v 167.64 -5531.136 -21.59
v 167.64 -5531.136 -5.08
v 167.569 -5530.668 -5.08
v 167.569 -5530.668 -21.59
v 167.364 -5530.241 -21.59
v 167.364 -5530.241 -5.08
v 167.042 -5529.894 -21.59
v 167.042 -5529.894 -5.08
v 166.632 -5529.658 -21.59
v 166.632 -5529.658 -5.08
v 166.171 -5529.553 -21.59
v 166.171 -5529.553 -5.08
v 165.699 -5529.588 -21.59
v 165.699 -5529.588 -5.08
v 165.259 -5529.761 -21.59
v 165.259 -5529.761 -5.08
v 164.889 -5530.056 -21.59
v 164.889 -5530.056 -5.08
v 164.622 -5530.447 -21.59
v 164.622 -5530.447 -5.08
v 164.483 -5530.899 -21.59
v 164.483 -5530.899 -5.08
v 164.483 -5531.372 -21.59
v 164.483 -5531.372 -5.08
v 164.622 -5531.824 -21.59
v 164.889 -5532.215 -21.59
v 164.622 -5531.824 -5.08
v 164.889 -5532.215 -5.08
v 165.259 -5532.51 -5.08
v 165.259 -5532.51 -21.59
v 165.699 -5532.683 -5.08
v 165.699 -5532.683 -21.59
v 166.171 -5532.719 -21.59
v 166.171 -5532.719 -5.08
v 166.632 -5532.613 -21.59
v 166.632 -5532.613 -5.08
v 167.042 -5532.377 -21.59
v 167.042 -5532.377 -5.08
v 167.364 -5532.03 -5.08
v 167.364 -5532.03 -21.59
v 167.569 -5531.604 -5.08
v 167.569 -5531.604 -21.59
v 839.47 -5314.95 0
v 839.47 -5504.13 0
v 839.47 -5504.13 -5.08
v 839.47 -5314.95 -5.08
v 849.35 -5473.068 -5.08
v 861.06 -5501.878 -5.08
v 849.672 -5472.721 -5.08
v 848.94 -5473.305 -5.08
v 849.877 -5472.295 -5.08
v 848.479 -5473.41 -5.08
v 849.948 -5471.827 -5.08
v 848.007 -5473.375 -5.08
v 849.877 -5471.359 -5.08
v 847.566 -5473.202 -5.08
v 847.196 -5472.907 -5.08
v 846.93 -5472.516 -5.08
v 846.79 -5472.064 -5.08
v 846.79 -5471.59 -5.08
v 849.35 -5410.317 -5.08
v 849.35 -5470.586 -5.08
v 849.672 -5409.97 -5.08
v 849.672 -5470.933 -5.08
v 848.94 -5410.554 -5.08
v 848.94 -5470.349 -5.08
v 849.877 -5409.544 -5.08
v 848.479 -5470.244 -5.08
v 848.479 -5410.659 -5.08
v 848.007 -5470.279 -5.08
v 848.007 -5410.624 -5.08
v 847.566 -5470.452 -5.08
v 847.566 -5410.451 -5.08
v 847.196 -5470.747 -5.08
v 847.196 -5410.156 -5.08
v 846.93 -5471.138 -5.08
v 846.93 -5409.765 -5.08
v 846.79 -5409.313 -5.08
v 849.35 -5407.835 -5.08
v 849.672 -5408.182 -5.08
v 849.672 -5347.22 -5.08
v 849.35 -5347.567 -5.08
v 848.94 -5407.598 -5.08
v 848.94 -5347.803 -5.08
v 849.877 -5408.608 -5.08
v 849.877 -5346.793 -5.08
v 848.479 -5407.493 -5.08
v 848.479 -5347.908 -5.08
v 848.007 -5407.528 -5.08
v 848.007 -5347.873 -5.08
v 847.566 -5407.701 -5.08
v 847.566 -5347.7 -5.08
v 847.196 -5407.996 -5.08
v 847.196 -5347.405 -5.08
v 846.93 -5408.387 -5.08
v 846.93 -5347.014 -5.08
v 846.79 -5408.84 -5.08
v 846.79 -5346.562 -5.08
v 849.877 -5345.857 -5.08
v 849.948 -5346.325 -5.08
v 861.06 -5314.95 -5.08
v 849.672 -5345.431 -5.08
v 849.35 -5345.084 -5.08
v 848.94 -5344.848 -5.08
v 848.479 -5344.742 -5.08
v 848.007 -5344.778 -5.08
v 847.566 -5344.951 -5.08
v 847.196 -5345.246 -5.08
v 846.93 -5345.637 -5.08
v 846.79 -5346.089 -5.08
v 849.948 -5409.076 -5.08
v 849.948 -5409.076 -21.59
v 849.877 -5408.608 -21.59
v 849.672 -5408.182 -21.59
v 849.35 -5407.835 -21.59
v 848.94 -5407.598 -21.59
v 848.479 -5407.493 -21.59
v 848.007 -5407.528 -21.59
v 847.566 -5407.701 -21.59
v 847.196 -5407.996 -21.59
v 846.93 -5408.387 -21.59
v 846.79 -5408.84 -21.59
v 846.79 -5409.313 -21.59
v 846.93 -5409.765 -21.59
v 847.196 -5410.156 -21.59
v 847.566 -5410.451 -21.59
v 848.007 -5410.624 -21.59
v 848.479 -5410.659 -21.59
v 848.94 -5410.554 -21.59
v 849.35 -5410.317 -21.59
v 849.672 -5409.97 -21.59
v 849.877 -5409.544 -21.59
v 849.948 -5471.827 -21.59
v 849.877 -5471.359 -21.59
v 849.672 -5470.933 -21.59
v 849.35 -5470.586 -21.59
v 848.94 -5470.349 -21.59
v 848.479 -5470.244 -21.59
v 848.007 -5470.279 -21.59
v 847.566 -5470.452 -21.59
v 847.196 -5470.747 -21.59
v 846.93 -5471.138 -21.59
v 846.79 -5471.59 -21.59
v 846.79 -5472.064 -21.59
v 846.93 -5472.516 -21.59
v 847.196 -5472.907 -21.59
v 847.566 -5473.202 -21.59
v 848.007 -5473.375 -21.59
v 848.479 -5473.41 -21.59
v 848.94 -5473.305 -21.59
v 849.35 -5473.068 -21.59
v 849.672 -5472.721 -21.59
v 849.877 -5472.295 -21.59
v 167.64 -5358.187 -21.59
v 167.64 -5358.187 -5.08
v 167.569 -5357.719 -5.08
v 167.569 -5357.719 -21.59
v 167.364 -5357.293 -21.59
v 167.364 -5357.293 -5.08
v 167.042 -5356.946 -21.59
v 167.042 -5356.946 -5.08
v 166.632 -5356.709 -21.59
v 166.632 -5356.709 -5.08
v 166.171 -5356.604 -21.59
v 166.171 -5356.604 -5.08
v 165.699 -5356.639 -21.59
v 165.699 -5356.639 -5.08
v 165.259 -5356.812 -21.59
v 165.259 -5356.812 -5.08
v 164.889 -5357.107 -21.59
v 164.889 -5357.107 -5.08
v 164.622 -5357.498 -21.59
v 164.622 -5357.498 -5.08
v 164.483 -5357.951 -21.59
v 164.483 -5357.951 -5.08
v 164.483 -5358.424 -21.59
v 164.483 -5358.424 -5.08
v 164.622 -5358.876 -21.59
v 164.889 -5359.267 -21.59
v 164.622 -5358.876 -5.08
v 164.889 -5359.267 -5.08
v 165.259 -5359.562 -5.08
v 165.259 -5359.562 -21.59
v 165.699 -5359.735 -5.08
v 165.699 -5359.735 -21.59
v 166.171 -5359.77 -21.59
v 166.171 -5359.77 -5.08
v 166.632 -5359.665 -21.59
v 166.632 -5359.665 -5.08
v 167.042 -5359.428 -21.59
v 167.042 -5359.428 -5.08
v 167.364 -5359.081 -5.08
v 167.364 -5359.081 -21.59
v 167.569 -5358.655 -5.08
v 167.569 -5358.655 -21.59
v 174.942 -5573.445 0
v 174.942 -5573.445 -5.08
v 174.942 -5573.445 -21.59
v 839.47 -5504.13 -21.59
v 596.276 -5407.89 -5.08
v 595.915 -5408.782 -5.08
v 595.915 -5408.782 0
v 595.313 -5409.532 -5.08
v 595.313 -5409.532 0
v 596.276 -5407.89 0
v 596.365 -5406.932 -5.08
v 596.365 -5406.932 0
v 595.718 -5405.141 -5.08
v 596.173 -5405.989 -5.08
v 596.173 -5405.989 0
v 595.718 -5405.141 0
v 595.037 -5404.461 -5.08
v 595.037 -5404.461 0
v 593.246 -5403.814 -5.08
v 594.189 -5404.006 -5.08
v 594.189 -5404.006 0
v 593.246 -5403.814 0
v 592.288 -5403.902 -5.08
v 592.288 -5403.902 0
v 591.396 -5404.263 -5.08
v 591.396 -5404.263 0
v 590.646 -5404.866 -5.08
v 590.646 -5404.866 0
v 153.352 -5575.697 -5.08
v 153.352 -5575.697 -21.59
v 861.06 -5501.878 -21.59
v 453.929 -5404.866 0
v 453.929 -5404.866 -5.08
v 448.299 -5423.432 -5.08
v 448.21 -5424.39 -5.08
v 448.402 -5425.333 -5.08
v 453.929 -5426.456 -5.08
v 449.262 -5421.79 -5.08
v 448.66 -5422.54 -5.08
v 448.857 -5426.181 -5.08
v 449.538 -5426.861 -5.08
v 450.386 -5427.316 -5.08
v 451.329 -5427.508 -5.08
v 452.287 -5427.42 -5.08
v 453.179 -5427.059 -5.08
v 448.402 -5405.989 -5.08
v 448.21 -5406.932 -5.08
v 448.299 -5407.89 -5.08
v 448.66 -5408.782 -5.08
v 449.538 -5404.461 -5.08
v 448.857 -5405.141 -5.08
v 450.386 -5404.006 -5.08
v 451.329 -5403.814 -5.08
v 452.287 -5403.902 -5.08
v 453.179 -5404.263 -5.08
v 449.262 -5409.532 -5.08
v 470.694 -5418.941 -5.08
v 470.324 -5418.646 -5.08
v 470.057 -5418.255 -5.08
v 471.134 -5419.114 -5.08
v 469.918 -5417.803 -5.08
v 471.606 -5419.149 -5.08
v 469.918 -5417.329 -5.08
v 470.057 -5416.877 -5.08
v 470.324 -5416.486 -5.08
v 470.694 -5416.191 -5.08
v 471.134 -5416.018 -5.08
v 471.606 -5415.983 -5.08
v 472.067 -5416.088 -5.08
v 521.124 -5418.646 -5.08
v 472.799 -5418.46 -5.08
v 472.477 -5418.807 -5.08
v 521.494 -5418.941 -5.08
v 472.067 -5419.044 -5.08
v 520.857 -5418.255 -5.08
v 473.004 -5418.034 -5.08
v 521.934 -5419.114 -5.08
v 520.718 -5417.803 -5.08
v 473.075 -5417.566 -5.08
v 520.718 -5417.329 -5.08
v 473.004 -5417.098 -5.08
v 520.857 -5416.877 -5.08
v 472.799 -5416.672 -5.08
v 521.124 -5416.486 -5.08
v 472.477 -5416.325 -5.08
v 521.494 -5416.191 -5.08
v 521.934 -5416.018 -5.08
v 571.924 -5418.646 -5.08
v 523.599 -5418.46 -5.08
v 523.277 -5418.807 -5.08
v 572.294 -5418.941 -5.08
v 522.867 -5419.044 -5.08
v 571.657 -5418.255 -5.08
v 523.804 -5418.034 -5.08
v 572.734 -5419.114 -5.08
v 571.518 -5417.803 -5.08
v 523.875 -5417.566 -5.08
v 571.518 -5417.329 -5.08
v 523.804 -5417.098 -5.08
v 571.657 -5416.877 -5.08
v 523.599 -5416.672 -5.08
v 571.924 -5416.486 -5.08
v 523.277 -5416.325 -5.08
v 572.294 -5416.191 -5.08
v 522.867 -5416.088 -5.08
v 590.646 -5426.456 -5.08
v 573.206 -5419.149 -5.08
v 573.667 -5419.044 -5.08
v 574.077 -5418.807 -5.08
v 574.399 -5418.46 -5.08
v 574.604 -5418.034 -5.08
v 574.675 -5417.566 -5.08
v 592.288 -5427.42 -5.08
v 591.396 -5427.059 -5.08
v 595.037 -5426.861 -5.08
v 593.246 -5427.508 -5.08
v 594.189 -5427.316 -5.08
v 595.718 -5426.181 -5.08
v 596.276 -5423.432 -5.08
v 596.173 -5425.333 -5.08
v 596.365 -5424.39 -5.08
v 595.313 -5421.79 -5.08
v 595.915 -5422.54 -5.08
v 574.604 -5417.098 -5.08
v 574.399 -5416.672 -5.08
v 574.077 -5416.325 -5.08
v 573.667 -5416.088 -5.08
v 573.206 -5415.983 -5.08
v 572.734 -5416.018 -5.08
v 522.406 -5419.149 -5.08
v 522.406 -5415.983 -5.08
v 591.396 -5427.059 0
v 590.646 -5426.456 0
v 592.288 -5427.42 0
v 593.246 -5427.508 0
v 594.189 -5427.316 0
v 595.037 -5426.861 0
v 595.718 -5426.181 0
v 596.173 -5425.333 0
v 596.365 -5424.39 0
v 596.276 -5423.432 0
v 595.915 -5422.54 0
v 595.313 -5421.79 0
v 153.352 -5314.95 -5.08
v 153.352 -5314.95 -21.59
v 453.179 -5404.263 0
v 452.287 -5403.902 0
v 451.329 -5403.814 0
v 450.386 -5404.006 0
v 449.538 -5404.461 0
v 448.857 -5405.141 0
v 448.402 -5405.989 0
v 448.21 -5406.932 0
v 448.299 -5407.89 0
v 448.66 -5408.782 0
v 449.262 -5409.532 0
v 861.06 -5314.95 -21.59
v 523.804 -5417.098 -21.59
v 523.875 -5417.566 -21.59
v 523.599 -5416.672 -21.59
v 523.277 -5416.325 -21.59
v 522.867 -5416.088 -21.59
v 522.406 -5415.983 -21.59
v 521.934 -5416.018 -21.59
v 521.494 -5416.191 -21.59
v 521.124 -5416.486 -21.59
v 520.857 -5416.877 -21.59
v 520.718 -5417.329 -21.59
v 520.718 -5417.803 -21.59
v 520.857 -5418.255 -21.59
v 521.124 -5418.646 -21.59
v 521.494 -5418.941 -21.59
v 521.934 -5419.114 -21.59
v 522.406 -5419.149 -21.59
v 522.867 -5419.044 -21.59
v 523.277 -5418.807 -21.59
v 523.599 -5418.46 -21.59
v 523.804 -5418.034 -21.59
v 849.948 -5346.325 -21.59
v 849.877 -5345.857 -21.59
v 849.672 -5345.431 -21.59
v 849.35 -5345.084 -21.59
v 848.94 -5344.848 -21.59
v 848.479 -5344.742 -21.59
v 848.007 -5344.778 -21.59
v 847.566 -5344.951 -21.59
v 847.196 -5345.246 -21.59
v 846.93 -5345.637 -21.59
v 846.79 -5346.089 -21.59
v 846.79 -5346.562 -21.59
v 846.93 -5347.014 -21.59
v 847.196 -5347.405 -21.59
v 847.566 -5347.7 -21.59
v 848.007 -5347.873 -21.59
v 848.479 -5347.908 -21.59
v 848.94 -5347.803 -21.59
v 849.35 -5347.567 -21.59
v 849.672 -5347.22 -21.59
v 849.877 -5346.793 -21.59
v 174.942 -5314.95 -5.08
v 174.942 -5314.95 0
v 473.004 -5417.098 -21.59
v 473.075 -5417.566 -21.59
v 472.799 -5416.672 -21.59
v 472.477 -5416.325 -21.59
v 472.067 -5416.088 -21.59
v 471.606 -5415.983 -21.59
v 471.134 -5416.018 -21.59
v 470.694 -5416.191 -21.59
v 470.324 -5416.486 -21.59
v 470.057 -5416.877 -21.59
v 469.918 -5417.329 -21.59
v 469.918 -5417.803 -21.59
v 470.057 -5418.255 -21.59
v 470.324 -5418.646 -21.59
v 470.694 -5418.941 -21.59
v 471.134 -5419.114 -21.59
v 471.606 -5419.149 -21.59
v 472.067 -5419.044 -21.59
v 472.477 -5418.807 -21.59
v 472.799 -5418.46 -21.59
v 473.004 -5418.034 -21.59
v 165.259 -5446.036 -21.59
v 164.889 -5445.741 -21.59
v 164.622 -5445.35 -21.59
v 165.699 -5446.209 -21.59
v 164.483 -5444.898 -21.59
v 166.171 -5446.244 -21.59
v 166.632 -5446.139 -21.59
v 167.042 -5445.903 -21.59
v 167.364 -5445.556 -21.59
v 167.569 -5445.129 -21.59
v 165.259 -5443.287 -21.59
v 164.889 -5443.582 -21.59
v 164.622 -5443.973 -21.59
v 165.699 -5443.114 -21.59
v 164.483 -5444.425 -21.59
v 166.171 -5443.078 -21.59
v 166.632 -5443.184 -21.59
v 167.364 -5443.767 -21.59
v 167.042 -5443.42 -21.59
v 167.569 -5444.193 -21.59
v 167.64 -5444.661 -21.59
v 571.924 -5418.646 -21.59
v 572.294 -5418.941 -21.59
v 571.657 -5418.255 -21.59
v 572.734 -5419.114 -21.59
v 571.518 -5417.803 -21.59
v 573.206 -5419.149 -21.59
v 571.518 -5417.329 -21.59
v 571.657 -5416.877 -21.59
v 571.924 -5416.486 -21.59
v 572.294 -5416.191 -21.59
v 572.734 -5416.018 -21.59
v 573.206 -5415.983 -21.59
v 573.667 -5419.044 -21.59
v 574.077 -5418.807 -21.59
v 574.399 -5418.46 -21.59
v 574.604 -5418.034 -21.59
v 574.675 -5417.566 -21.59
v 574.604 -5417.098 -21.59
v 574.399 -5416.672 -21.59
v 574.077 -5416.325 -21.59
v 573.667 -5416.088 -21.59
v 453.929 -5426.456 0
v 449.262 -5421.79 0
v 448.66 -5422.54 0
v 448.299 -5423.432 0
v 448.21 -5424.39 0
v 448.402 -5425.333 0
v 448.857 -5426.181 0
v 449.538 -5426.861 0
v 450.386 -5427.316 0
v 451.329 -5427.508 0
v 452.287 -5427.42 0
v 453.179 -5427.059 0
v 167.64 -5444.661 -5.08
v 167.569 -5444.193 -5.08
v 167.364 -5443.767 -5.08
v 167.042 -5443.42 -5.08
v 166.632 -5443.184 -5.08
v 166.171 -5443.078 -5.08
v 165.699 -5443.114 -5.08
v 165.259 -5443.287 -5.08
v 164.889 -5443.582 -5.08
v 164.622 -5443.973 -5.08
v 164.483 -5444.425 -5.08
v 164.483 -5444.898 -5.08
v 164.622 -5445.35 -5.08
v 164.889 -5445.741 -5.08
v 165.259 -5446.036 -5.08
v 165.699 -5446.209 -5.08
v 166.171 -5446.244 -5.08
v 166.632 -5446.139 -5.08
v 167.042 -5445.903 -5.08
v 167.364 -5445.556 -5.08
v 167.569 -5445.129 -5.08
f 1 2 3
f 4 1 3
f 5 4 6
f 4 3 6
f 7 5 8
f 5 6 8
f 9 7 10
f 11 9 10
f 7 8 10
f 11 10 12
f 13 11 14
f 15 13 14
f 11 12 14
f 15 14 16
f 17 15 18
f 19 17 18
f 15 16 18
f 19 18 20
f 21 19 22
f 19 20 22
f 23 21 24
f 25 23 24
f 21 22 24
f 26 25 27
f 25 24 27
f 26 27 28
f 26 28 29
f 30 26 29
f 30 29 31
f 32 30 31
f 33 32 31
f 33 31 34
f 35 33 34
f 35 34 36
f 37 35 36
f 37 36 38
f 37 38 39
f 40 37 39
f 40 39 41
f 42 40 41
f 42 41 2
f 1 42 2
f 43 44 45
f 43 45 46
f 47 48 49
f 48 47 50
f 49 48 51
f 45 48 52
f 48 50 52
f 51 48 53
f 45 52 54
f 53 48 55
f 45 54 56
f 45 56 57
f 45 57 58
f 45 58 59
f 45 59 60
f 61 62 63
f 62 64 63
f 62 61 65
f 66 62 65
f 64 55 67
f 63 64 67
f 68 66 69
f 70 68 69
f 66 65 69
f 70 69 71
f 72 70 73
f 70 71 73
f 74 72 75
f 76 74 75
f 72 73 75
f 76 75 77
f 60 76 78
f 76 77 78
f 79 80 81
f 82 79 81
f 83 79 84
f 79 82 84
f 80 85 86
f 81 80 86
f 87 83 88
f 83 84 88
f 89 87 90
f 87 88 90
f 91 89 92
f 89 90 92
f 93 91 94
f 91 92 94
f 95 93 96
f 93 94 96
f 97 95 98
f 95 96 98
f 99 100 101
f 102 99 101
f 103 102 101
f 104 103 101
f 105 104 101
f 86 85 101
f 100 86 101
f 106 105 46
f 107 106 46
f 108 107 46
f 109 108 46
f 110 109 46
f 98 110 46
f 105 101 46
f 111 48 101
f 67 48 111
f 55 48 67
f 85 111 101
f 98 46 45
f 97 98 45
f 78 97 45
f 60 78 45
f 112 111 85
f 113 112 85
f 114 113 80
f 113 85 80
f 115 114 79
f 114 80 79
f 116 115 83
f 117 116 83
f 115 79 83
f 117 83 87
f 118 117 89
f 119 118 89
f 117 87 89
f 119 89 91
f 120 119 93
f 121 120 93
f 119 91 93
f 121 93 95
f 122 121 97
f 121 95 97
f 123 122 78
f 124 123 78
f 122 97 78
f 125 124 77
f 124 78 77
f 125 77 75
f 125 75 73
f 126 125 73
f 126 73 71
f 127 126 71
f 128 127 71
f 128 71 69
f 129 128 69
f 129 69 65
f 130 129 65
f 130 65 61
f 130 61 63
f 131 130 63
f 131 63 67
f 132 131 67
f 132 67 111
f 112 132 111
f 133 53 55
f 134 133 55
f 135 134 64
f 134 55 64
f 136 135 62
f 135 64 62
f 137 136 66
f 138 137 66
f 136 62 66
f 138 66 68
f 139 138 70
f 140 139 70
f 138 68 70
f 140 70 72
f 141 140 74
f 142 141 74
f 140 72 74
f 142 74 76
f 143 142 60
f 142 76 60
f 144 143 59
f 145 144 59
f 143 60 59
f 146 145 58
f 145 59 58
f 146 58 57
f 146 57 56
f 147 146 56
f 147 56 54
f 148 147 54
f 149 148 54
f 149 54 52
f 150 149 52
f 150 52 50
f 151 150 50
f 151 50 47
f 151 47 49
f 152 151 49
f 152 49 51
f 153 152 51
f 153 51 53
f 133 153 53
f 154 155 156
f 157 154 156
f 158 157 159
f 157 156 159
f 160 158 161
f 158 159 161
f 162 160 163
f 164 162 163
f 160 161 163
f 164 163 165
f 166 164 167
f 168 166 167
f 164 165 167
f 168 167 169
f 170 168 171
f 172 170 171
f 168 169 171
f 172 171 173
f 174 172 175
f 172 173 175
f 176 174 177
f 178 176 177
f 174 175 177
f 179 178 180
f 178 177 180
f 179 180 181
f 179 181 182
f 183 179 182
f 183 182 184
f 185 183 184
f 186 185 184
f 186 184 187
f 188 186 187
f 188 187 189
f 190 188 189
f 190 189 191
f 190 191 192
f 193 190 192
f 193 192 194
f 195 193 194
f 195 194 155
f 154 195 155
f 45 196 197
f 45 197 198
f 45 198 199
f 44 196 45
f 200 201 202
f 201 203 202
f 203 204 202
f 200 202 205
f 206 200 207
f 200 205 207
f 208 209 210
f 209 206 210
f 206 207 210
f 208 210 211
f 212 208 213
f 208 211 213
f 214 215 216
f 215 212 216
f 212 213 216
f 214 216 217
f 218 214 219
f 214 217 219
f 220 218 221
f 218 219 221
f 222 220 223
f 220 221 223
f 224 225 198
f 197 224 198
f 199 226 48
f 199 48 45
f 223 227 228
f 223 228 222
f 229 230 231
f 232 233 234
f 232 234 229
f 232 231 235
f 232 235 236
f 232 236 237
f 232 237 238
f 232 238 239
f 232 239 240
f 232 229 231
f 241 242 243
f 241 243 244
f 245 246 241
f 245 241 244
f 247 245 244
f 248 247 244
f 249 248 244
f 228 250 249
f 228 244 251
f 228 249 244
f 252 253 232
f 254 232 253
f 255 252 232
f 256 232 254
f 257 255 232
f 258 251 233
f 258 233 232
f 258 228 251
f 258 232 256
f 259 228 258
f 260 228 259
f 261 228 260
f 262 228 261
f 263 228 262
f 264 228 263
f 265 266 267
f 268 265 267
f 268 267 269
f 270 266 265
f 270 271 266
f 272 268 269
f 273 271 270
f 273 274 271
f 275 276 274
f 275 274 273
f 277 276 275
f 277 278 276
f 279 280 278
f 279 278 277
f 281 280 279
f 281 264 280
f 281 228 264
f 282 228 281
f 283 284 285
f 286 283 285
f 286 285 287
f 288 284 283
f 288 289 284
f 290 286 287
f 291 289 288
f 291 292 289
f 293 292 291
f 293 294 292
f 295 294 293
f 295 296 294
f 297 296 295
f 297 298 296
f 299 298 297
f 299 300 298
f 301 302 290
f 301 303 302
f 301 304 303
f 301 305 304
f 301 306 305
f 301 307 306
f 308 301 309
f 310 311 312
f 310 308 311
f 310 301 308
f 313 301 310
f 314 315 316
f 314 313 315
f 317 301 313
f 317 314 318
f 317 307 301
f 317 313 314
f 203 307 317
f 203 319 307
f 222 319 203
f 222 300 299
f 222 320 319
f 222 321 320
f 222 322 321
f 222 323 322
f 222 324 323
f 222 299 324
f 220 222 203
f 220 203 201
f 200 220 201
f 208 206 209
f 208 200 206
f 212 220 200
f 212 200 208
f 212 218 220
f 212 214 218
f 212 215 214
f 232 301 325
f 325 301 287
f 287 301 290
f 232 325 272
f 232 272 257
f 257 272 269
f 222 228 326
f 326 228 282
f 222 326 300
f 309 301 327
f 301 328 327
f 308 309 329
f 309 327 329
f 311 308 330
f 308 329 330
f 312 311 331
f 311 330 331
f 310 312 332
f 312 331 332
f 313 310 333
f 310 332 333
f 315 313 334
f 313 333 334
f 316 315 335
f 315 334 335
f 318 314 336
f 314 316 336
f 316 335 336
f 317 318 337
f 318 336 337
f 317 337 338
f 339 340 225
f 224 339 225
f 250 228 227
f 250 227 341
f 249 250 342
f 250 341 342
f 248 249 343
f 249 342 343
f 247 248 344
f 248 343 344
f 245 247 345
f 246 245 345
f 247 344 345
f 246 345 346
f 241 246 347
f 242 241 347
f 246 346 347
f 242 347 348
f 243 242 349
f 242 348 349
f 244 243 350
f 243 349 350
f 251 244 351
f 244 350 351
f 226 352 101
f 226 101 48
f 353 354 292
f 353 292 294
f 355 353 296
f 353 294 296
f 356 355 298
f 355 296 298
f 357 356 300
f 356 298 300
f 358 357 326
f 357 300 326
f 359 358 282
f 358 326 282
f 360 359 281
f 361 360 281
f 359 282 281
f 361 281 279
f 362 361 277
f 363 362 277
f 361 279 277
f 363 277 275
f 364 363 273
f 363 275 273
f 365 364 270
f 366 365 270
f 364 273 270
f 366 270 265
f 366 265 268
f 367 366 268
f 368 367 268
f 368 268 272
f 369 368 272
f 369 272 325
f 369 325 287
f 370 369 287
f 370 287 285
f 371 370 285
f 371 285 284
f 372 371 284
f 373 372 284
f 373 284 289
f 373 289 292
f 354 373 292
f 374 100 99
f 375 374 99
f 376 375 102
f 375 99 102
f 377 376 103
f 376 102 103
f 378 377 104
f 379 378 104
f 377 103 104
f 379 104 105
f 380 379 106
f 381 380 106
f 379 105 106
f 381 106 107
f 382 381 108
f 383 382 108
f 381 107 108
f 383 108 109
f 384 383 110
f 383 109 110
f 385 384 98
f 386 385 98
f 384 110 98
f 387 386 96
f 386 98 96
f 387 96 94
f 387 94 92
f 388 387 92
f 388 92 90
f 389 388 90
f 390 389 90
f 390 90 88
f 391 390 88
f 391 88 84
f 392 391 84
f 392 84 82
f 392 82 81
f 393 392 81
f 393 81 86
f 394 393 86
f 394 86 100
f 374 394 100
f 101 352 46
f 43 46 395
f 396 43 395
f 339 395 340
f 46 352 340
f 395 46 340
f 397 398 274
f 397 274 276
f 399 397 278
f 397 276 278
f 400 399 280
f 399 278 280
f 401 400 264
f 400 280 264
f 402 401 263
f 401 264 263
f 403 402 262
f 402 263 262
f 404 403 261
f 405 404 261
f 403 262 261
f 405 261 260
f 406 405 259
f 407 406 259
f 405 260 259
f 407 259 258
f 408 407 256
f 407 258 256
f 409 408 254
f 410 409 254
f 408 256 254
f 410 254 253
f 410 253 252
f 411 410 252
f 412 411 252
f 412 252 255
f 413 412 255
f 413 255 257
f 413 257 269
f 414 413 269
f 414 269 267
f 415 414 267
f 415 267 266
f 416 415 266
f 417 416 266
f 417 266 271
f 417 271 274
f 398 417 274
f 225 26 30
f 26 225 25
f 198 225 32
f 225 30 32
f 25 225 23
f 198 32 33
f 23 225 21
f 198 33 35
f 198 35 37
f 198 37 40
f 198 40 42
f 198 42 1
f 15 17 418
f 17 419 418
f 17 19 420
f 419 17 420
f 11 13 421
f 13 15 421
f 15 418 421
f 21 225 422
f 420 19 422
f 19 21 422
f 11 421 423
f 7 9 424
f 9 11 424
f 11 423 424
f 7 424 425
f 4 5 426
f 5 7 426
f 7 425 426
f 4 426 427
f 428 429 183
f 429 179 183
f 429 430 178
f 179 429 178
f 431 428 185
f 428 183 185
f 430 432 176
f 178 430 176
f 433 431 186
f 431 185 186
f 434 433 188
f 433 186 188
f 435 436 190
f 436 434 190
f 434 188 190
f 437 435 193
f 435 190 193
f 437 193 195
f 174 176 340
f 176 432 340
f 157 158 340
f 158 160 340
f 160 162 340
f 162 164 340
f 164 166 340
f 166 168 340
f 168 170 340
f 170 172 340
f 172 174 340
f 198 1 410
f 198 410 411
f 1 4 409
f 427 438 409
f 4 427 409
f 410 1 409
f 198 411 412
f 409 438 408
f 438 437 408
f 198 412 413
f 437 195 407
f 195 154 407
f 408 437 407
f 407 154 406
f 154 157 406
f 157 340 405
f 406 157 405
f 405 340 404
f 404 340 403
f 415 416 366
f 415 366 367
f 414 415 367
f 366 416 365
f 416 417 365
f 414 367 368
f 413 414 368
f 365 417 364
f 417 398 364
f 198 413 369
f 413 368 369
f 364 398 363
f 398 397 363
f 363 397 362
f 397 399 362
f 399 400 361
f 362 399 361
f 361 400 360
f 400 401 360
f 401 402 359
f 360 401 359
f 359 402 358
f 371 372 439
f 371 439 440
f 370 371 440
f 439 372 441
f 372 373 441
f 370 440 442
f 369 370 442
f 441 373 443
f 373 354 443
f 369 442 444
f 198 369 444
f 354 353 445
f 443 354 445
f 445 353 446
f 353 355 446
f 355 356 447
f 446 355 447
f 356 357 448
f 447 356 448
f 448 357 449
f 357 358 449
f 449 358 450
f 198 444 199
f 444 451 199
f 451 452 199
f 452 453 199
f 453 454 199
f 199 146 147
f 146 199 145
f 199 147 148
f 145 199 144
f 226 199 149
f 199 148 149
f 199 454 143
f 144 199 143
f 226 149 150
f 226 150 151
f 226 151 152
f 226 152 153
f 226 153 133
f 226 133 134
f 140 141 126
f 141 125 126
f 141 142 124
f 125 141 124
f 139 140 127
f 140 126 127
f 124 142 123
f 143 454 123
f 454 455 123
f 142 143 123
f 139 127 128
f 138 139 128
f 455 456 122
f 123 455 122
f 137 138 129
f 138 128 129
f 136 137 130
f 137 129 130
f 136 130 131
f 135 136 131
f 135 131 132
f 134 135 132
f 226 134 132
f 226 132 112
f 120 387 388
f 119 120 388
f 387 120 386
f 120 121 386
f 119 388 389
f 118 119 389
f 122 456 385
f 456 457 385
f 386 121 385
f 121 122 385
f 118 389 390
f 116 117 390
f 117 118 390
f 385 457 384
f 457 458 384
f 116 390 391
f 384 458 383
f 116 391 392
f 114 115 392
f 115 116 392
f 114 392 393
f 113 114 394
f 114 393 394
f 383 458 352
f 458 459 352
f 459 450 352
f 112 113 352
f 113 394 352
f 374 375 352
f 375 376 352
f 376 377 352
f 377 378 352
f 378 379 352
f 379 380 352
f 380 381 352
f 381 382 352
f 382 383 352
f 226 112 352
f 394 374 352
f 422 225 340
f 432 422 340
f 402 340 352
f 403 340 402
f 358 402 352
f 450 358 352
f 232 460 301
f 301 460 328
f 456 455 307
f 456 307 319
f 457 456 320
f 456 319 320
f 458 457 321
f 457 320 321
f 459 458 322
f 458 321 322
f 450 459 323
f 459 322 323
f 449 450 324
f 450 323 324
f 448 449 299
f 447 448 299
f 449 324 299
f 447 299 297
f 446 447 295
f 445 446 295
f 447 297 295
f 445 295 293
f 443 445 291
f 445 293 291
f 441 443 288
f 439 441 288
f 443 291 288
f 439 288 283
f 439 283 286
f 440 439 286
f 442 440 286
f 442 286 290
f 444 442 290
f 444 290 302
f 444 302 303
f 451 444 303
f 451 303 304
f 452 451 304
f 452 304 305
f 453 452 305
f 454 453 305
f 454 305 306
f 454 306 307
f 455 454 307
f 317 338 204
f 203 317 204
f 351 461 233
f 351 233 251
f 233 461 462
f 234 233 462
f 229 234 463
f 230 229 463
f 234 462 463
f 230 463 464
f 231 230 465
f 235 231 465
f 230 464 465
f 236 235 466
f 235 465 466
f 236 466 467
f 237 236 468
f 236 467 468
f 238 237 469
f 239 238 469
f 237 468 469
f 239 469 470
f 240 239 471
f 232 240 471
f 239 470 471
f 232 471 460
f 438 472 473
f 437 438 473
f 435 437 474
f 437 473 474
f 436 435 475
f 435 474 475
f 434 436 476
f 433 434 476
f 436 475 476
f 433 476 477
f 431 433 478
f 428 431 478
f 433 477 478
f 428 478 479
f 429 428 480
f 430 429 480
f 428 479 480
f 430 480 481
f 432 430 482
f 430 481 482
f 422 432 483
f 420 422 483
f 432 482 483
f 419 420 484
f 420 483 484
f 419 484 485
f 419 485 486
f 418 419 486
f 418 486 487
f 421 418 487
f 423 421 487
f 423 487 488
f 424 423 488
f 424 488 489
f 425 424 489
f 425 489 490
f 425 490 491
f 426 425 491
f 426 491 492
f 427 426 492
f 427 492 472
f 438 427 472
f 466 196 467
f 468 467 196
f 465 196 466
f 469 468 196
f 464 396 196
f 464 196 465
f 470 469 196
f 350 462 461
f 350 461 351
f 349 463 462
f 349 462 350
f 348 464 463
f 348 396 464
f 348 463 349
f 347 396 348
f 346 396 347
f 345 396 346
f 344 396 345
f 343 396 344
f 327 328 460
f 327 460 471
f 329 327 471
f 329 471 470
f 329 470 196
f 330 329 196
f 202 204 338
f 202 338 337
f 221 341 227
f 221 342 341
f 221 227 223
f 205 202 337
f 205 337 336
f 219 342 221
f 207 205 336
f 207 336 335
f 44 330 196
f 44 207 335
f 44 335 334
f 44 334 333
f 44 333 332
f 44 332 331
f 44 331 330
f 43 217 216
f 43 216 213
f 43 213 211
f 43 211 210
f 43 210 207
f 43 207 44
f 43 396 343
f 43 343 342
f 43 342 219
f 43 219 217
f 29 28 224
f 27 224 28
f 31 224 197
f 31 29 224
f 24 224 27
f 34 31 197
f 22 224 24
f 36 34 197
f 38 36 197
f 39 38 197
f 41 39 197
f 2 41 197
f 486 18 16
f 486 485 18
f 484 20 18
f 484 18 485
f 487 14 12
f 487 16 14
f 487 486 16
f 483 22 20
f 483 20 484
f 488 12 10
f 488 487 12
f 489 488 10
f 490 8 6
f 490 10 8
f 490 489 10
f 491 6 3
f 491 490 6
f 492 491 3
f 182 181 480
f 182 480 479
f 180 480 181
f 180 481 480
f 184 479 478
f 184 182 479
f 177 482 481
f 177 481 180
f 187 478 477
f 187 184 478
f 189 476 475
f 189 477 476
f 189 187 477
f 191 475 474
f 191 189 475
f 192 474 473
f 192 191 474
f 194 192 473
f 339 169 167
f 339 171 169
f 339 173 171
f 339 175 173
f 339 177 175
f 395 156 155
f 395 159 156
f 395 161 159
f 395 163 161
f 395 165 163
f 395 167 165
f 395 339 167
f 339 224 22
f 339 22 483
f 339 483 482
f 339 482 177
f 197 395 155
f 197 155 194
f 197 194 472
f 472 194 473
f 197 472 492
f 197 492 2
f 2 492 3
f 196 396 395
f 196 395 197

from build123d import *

# Parameters (mm, degrees)
EXTRUDE1_DEPTH     = 21.59
EXTRUDE2_DEPTH     = 16.51
SKETCH4_W          = 146.050000002
SKETCH4_H          = 21.59
CUT_EXTRUDE2_DEPTH = 5.08
SKETCH6_R          = 3.302000001
SKETCH6_R_2        = 3.302
CUT_EXTRUDE3_DEPTH = 5.08
SKETCH3_R          = 1.5875
CUT_EXTRUDE1_DEPTH = 21.59


with BuildPart() as part:
    # Sketch2 → Extrude1 (new body)
    with BuildSketch(Plane.XY):
        Polygon((839.47, -5504.129603175), (839.47, -5314.95), (174.9425, -5314.95), (174.9425, -5573.445396825), align=None)
    extrude(amount=-EXTRUDE1_DEPTH)

    # Sketch7 → Extrude2 (add)
    with BuildSketch(Plane(origin=(0, 0, -21.59), x_dir=(-1, 0, 0), z_dir=(0, 0, -1))):
        Polygon((-174.9425, -5314.95), (-153.3525, -5314.95), (-153.3525, -5575.697414966), (-174.9425, -5573.445396825), align=None)
        Polygon((-839.47, -5314.95), (-861.06, -5314.95), (-861.06, -5501.877585034), (-839.47, -5504.129603175), align=None)
    extrude(amount=-EXTRUDE2_DEPTH)

    # Sketch4 → Cut-Extrude2 (cut)
    with BuildSketch(Plane.XY):
        with Locations((522.2875, -5415.661000001)):
            Rectangle(SKETCH4_W, SKETCH4_H)
    extrude(amount=-CUT_EXTRUDE2_DEPTH, mode=Mode.SUBTRACT)

    # Sketch6 → Cut-Extrude3 (cut)
    with BuildSketch(Plane.XY):
        with Locations((451.507564029, -5407.111064031)):
            Circle(SKETCH6_R)
        with Locations((451.507564029, -5424.210935971)):
            Circle(SKETCH6_R_2)
        with Locations((593.067435971, -5424.210935971)):
            Circle(SKETCH6_R_2)
        with Locations((593.067435971, -5407.111064031)):
            Circle(SKETCH6_R)
    extrude(amount=-CUT_EXTRUDE3_DEPTH, mode=Mode.SUBTRACT)

    # Sketch3 → Cut-Extrude1 (cut)
    with BuildSketch(Plane.XY):
        with Locations((166.0525, -5531.135582009)):
            Circle(SKETCH3_R)
        with Locations((166.0525, -5444.661349205)):
            Circle(SKETCH3_R)
        with Locations((166.0525, -5358.187116401)):
            Circle(SKETCH3_R)
        with Locations((848.36, -5471.826917991)):
            Circle(SKETCH3_R)
        with Locations((848.36, -5409.076150795)):
            Circle(SKETCH3_R)
        with Locations((848.36, -5346.325383599)):
            Circle(SKETCH3_R)
        with Locations((573.0875, -5417.566)):
            Circle(SKETCH3_R)
        with Locations((522.2875, -5417.566)):
            Circle(SKETCH3_R)
        with Locations((471.4875, -5417.566)):
            Circle(SKETCH3_R)
    extrude(amount=-CUT_EXTRUDE1_DEPTH, mode=Mode.SUBTRACT)


solid = part.part
